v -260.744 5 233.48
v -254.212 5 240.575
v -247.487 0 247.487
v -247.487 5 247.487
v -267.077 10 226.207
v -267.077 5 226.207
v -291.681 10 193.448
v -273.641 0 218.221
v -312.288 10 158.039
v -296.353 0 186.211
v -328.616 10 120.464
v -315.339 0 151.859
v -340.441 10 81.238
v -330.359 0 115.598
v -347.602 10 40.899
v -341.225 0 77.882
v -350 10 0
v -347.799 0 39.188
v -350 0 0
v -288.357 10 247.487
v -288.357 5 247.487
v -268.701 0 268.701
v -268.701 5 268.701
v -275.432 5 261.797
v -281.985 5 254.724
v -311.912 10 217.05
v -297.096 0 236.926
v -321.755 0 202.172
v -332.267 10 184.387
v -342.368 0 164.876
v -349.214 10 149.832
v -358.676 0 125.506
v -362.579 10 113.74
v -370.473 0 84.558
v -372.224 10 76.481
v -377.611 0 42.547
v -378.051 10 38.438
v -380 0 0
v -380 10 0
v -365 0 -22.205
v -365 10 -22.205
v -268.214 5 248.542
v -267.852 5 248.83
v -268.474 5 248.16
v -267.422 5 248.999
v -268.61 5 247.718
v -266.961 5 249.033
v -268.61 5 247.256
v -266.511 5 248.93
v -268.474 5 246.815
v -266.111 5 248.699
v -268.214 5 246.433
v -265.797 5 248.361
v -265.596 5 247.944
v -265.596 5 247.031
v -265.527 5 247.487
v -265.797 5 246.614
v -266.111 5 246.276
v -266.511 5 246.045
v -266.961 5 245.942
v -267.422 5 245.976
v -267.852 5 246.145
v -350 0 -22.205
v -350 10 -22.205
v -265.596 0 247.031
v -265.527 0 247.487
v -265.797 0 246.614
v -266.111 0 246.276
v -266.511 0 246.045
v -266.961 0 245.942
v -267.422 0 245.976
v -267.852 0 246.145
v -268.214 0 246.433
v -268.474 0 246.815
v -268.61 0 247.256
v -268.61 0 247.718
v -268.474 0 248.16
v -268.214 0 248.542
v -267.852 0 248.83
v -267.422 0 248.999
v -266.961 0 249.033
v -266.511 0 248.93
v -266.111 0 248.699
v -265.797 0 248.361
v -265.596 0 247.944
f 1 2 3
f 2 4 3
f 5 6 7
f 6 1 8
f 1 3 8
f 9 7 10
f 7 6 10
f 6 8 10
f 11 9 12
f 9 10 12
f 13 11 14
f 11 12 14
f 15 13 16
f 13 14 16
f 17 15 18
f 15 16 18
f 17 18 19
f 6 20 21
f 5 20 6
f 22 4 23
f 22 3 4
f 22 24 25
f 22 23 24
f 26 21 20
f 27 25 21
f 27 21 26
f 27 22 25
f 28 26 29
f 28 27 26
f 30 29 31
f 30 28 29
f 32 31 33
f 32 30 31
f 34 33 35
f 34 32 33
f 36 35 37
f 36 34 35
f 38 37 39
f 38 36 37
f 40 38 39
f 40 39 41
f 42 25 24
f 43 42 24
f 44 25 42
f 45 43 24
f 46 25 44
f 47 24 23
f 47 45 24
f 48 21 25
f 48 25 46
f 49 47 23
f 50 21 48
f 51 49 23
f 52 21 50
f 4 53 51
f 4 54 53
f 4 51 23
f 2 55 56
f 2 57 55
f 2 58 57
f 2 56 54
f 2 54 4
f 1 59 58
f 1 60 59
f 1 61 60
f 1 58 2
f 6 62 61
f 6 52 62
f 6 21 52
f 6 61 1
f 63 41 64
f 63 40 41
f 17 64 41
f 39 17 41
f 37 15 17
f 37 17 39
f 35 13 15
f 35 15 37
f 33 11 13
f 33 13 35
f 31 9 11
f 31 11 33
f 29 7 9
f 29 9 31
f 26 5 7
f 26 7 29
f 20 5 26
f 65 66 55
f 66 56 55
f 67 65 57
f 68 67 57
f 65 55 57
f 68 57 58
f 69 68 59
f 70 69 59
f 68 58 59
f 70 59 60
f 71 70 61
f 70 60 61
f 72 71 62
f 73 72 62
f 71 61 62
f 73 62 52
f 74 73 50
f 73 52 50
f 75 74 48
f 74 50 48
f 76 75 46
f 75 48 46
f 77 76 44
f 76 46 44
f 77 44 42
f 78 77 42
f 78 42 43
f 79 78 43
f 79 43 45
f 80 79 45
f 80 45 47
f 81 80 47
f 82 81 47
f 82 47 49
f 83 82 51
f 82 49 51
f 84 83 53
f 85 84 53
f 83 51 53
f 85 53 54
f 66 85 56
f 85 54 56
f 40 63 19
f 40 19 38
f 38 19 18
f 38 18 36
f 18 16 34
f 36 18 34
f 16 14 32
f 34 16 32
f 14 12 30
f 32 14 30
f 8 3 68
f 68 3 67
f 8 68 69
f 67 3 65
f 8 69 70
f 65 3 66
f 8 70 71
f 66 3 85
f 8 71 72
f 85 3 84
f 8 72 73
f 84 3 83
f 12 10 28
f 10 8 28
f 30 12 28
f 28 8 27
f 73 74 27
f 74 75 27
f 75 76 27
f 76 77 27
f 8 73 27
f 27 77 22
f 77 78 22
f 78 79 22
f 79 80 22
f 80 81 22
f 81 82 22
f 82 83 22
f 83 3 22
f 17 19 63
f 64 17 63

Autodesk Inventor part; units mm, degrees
ref_plane "YZ Plane" through (0, 0, 0) normal (1, 0, 0) x (0, 1, 0)
ref_plane "XZ Plane" through (0, 0, 0) normal (0, 1, 0) x (-1, 0, 0)
ref_plane "XY Plane" through (0, 0, 0) normal (0, 0, 1) x (1, 0, 0)
sketch "Sketch1" plane through (0, 0, 0) normal (0, 1, 0) x (-1, 0, 0)
  arc A0 (350, 0) -> (0, 350) centre (0, 0) ccw
  line L0 (350, 0) -> (350, -22.2048)
  line L1 (0, 350) -> (-24.6, 350)
  line L2 (-24.6, 380) -> (0, 380)
  arc A1 (380, 0) -> (0, 380) centre (0, 0) ccw
  line L3 (380, 0) -> (380, -22.2048)
  line L4 (380, -22.2048) -> (350, -22.2048)
  line L5 (-24.6, 380) -> (-24.6, 350)
  line L6 (380, 0) -> (365, -22.2048)
  line L7 (0, 0) -> (268.7006, 268.7006)
  line L8 (0, 0) -> (0, 91.6225)
  point P0 (247.4874, 247.4874)
  dimension "d0" = 350
  dimension "d1" = 374.6
  dimension "d2" = 30
extrude "Extrusion1" add sketch "Sketch1" along normal blind 10 contours A0 L7 A1 L6 L4 L0
sketch "Sketch2" plane through (0, 10, 0) normal (0, 1, 0) x (1, 0, 0)
  line L0 (-350, 22.2048) -> (-365, 22.2048) projected
  line L1 (-365, 22.2048) -> (-380, 0) projected
  arc A0 (-380, 0) -> (-268.7006, -268.7006) centre (0, 0) ccw projected
  line L2 (-268.7006, -268.7006) -> (-247.4874, -247.4874) projected
  arc A1 (-350, 0) -> (-247.4874, -247.4874) centre (0, 0) ccw projected
  line L3 (-350, 0) -> (-350, 22.2048) projected
  line L4 (-288.3574, -247.4874) -> (-267.0773, -226.2072)
extrude "Extrusion2" cut sketch "Sketch2" against normal blind 5 contours A1 L2 A0 L4
sketch "Sketch3" plane through (0, 10, 0) normal (0, 1, 0) x (1, 0, 0)
  arc A0 (-267.0773, -226.2072) -> (-247.4874, -247.4874) centre (0, 0) ccw projected
  line L0 (-288.3574, -247.4874) -> (-267.0773, -226.2072) projected
  arc A1 (-288.3574, -247.4874) -> (-268.7006, -268.7006) centre (0, 0) ccw projected
  line L1 (-247.4874, -247.4874) -> (-268.7006, -268.7006) projected
  circle A2 centre (-267.0773, -247.4874) radius 1.55
  dimension "d7" = 3.1
extrude "Extrusion3" cut sketch "Sketch3" against normal through all contours A2
properties part number "MOLDE_CURVA_1" material "Steel, Mild, Welded"
